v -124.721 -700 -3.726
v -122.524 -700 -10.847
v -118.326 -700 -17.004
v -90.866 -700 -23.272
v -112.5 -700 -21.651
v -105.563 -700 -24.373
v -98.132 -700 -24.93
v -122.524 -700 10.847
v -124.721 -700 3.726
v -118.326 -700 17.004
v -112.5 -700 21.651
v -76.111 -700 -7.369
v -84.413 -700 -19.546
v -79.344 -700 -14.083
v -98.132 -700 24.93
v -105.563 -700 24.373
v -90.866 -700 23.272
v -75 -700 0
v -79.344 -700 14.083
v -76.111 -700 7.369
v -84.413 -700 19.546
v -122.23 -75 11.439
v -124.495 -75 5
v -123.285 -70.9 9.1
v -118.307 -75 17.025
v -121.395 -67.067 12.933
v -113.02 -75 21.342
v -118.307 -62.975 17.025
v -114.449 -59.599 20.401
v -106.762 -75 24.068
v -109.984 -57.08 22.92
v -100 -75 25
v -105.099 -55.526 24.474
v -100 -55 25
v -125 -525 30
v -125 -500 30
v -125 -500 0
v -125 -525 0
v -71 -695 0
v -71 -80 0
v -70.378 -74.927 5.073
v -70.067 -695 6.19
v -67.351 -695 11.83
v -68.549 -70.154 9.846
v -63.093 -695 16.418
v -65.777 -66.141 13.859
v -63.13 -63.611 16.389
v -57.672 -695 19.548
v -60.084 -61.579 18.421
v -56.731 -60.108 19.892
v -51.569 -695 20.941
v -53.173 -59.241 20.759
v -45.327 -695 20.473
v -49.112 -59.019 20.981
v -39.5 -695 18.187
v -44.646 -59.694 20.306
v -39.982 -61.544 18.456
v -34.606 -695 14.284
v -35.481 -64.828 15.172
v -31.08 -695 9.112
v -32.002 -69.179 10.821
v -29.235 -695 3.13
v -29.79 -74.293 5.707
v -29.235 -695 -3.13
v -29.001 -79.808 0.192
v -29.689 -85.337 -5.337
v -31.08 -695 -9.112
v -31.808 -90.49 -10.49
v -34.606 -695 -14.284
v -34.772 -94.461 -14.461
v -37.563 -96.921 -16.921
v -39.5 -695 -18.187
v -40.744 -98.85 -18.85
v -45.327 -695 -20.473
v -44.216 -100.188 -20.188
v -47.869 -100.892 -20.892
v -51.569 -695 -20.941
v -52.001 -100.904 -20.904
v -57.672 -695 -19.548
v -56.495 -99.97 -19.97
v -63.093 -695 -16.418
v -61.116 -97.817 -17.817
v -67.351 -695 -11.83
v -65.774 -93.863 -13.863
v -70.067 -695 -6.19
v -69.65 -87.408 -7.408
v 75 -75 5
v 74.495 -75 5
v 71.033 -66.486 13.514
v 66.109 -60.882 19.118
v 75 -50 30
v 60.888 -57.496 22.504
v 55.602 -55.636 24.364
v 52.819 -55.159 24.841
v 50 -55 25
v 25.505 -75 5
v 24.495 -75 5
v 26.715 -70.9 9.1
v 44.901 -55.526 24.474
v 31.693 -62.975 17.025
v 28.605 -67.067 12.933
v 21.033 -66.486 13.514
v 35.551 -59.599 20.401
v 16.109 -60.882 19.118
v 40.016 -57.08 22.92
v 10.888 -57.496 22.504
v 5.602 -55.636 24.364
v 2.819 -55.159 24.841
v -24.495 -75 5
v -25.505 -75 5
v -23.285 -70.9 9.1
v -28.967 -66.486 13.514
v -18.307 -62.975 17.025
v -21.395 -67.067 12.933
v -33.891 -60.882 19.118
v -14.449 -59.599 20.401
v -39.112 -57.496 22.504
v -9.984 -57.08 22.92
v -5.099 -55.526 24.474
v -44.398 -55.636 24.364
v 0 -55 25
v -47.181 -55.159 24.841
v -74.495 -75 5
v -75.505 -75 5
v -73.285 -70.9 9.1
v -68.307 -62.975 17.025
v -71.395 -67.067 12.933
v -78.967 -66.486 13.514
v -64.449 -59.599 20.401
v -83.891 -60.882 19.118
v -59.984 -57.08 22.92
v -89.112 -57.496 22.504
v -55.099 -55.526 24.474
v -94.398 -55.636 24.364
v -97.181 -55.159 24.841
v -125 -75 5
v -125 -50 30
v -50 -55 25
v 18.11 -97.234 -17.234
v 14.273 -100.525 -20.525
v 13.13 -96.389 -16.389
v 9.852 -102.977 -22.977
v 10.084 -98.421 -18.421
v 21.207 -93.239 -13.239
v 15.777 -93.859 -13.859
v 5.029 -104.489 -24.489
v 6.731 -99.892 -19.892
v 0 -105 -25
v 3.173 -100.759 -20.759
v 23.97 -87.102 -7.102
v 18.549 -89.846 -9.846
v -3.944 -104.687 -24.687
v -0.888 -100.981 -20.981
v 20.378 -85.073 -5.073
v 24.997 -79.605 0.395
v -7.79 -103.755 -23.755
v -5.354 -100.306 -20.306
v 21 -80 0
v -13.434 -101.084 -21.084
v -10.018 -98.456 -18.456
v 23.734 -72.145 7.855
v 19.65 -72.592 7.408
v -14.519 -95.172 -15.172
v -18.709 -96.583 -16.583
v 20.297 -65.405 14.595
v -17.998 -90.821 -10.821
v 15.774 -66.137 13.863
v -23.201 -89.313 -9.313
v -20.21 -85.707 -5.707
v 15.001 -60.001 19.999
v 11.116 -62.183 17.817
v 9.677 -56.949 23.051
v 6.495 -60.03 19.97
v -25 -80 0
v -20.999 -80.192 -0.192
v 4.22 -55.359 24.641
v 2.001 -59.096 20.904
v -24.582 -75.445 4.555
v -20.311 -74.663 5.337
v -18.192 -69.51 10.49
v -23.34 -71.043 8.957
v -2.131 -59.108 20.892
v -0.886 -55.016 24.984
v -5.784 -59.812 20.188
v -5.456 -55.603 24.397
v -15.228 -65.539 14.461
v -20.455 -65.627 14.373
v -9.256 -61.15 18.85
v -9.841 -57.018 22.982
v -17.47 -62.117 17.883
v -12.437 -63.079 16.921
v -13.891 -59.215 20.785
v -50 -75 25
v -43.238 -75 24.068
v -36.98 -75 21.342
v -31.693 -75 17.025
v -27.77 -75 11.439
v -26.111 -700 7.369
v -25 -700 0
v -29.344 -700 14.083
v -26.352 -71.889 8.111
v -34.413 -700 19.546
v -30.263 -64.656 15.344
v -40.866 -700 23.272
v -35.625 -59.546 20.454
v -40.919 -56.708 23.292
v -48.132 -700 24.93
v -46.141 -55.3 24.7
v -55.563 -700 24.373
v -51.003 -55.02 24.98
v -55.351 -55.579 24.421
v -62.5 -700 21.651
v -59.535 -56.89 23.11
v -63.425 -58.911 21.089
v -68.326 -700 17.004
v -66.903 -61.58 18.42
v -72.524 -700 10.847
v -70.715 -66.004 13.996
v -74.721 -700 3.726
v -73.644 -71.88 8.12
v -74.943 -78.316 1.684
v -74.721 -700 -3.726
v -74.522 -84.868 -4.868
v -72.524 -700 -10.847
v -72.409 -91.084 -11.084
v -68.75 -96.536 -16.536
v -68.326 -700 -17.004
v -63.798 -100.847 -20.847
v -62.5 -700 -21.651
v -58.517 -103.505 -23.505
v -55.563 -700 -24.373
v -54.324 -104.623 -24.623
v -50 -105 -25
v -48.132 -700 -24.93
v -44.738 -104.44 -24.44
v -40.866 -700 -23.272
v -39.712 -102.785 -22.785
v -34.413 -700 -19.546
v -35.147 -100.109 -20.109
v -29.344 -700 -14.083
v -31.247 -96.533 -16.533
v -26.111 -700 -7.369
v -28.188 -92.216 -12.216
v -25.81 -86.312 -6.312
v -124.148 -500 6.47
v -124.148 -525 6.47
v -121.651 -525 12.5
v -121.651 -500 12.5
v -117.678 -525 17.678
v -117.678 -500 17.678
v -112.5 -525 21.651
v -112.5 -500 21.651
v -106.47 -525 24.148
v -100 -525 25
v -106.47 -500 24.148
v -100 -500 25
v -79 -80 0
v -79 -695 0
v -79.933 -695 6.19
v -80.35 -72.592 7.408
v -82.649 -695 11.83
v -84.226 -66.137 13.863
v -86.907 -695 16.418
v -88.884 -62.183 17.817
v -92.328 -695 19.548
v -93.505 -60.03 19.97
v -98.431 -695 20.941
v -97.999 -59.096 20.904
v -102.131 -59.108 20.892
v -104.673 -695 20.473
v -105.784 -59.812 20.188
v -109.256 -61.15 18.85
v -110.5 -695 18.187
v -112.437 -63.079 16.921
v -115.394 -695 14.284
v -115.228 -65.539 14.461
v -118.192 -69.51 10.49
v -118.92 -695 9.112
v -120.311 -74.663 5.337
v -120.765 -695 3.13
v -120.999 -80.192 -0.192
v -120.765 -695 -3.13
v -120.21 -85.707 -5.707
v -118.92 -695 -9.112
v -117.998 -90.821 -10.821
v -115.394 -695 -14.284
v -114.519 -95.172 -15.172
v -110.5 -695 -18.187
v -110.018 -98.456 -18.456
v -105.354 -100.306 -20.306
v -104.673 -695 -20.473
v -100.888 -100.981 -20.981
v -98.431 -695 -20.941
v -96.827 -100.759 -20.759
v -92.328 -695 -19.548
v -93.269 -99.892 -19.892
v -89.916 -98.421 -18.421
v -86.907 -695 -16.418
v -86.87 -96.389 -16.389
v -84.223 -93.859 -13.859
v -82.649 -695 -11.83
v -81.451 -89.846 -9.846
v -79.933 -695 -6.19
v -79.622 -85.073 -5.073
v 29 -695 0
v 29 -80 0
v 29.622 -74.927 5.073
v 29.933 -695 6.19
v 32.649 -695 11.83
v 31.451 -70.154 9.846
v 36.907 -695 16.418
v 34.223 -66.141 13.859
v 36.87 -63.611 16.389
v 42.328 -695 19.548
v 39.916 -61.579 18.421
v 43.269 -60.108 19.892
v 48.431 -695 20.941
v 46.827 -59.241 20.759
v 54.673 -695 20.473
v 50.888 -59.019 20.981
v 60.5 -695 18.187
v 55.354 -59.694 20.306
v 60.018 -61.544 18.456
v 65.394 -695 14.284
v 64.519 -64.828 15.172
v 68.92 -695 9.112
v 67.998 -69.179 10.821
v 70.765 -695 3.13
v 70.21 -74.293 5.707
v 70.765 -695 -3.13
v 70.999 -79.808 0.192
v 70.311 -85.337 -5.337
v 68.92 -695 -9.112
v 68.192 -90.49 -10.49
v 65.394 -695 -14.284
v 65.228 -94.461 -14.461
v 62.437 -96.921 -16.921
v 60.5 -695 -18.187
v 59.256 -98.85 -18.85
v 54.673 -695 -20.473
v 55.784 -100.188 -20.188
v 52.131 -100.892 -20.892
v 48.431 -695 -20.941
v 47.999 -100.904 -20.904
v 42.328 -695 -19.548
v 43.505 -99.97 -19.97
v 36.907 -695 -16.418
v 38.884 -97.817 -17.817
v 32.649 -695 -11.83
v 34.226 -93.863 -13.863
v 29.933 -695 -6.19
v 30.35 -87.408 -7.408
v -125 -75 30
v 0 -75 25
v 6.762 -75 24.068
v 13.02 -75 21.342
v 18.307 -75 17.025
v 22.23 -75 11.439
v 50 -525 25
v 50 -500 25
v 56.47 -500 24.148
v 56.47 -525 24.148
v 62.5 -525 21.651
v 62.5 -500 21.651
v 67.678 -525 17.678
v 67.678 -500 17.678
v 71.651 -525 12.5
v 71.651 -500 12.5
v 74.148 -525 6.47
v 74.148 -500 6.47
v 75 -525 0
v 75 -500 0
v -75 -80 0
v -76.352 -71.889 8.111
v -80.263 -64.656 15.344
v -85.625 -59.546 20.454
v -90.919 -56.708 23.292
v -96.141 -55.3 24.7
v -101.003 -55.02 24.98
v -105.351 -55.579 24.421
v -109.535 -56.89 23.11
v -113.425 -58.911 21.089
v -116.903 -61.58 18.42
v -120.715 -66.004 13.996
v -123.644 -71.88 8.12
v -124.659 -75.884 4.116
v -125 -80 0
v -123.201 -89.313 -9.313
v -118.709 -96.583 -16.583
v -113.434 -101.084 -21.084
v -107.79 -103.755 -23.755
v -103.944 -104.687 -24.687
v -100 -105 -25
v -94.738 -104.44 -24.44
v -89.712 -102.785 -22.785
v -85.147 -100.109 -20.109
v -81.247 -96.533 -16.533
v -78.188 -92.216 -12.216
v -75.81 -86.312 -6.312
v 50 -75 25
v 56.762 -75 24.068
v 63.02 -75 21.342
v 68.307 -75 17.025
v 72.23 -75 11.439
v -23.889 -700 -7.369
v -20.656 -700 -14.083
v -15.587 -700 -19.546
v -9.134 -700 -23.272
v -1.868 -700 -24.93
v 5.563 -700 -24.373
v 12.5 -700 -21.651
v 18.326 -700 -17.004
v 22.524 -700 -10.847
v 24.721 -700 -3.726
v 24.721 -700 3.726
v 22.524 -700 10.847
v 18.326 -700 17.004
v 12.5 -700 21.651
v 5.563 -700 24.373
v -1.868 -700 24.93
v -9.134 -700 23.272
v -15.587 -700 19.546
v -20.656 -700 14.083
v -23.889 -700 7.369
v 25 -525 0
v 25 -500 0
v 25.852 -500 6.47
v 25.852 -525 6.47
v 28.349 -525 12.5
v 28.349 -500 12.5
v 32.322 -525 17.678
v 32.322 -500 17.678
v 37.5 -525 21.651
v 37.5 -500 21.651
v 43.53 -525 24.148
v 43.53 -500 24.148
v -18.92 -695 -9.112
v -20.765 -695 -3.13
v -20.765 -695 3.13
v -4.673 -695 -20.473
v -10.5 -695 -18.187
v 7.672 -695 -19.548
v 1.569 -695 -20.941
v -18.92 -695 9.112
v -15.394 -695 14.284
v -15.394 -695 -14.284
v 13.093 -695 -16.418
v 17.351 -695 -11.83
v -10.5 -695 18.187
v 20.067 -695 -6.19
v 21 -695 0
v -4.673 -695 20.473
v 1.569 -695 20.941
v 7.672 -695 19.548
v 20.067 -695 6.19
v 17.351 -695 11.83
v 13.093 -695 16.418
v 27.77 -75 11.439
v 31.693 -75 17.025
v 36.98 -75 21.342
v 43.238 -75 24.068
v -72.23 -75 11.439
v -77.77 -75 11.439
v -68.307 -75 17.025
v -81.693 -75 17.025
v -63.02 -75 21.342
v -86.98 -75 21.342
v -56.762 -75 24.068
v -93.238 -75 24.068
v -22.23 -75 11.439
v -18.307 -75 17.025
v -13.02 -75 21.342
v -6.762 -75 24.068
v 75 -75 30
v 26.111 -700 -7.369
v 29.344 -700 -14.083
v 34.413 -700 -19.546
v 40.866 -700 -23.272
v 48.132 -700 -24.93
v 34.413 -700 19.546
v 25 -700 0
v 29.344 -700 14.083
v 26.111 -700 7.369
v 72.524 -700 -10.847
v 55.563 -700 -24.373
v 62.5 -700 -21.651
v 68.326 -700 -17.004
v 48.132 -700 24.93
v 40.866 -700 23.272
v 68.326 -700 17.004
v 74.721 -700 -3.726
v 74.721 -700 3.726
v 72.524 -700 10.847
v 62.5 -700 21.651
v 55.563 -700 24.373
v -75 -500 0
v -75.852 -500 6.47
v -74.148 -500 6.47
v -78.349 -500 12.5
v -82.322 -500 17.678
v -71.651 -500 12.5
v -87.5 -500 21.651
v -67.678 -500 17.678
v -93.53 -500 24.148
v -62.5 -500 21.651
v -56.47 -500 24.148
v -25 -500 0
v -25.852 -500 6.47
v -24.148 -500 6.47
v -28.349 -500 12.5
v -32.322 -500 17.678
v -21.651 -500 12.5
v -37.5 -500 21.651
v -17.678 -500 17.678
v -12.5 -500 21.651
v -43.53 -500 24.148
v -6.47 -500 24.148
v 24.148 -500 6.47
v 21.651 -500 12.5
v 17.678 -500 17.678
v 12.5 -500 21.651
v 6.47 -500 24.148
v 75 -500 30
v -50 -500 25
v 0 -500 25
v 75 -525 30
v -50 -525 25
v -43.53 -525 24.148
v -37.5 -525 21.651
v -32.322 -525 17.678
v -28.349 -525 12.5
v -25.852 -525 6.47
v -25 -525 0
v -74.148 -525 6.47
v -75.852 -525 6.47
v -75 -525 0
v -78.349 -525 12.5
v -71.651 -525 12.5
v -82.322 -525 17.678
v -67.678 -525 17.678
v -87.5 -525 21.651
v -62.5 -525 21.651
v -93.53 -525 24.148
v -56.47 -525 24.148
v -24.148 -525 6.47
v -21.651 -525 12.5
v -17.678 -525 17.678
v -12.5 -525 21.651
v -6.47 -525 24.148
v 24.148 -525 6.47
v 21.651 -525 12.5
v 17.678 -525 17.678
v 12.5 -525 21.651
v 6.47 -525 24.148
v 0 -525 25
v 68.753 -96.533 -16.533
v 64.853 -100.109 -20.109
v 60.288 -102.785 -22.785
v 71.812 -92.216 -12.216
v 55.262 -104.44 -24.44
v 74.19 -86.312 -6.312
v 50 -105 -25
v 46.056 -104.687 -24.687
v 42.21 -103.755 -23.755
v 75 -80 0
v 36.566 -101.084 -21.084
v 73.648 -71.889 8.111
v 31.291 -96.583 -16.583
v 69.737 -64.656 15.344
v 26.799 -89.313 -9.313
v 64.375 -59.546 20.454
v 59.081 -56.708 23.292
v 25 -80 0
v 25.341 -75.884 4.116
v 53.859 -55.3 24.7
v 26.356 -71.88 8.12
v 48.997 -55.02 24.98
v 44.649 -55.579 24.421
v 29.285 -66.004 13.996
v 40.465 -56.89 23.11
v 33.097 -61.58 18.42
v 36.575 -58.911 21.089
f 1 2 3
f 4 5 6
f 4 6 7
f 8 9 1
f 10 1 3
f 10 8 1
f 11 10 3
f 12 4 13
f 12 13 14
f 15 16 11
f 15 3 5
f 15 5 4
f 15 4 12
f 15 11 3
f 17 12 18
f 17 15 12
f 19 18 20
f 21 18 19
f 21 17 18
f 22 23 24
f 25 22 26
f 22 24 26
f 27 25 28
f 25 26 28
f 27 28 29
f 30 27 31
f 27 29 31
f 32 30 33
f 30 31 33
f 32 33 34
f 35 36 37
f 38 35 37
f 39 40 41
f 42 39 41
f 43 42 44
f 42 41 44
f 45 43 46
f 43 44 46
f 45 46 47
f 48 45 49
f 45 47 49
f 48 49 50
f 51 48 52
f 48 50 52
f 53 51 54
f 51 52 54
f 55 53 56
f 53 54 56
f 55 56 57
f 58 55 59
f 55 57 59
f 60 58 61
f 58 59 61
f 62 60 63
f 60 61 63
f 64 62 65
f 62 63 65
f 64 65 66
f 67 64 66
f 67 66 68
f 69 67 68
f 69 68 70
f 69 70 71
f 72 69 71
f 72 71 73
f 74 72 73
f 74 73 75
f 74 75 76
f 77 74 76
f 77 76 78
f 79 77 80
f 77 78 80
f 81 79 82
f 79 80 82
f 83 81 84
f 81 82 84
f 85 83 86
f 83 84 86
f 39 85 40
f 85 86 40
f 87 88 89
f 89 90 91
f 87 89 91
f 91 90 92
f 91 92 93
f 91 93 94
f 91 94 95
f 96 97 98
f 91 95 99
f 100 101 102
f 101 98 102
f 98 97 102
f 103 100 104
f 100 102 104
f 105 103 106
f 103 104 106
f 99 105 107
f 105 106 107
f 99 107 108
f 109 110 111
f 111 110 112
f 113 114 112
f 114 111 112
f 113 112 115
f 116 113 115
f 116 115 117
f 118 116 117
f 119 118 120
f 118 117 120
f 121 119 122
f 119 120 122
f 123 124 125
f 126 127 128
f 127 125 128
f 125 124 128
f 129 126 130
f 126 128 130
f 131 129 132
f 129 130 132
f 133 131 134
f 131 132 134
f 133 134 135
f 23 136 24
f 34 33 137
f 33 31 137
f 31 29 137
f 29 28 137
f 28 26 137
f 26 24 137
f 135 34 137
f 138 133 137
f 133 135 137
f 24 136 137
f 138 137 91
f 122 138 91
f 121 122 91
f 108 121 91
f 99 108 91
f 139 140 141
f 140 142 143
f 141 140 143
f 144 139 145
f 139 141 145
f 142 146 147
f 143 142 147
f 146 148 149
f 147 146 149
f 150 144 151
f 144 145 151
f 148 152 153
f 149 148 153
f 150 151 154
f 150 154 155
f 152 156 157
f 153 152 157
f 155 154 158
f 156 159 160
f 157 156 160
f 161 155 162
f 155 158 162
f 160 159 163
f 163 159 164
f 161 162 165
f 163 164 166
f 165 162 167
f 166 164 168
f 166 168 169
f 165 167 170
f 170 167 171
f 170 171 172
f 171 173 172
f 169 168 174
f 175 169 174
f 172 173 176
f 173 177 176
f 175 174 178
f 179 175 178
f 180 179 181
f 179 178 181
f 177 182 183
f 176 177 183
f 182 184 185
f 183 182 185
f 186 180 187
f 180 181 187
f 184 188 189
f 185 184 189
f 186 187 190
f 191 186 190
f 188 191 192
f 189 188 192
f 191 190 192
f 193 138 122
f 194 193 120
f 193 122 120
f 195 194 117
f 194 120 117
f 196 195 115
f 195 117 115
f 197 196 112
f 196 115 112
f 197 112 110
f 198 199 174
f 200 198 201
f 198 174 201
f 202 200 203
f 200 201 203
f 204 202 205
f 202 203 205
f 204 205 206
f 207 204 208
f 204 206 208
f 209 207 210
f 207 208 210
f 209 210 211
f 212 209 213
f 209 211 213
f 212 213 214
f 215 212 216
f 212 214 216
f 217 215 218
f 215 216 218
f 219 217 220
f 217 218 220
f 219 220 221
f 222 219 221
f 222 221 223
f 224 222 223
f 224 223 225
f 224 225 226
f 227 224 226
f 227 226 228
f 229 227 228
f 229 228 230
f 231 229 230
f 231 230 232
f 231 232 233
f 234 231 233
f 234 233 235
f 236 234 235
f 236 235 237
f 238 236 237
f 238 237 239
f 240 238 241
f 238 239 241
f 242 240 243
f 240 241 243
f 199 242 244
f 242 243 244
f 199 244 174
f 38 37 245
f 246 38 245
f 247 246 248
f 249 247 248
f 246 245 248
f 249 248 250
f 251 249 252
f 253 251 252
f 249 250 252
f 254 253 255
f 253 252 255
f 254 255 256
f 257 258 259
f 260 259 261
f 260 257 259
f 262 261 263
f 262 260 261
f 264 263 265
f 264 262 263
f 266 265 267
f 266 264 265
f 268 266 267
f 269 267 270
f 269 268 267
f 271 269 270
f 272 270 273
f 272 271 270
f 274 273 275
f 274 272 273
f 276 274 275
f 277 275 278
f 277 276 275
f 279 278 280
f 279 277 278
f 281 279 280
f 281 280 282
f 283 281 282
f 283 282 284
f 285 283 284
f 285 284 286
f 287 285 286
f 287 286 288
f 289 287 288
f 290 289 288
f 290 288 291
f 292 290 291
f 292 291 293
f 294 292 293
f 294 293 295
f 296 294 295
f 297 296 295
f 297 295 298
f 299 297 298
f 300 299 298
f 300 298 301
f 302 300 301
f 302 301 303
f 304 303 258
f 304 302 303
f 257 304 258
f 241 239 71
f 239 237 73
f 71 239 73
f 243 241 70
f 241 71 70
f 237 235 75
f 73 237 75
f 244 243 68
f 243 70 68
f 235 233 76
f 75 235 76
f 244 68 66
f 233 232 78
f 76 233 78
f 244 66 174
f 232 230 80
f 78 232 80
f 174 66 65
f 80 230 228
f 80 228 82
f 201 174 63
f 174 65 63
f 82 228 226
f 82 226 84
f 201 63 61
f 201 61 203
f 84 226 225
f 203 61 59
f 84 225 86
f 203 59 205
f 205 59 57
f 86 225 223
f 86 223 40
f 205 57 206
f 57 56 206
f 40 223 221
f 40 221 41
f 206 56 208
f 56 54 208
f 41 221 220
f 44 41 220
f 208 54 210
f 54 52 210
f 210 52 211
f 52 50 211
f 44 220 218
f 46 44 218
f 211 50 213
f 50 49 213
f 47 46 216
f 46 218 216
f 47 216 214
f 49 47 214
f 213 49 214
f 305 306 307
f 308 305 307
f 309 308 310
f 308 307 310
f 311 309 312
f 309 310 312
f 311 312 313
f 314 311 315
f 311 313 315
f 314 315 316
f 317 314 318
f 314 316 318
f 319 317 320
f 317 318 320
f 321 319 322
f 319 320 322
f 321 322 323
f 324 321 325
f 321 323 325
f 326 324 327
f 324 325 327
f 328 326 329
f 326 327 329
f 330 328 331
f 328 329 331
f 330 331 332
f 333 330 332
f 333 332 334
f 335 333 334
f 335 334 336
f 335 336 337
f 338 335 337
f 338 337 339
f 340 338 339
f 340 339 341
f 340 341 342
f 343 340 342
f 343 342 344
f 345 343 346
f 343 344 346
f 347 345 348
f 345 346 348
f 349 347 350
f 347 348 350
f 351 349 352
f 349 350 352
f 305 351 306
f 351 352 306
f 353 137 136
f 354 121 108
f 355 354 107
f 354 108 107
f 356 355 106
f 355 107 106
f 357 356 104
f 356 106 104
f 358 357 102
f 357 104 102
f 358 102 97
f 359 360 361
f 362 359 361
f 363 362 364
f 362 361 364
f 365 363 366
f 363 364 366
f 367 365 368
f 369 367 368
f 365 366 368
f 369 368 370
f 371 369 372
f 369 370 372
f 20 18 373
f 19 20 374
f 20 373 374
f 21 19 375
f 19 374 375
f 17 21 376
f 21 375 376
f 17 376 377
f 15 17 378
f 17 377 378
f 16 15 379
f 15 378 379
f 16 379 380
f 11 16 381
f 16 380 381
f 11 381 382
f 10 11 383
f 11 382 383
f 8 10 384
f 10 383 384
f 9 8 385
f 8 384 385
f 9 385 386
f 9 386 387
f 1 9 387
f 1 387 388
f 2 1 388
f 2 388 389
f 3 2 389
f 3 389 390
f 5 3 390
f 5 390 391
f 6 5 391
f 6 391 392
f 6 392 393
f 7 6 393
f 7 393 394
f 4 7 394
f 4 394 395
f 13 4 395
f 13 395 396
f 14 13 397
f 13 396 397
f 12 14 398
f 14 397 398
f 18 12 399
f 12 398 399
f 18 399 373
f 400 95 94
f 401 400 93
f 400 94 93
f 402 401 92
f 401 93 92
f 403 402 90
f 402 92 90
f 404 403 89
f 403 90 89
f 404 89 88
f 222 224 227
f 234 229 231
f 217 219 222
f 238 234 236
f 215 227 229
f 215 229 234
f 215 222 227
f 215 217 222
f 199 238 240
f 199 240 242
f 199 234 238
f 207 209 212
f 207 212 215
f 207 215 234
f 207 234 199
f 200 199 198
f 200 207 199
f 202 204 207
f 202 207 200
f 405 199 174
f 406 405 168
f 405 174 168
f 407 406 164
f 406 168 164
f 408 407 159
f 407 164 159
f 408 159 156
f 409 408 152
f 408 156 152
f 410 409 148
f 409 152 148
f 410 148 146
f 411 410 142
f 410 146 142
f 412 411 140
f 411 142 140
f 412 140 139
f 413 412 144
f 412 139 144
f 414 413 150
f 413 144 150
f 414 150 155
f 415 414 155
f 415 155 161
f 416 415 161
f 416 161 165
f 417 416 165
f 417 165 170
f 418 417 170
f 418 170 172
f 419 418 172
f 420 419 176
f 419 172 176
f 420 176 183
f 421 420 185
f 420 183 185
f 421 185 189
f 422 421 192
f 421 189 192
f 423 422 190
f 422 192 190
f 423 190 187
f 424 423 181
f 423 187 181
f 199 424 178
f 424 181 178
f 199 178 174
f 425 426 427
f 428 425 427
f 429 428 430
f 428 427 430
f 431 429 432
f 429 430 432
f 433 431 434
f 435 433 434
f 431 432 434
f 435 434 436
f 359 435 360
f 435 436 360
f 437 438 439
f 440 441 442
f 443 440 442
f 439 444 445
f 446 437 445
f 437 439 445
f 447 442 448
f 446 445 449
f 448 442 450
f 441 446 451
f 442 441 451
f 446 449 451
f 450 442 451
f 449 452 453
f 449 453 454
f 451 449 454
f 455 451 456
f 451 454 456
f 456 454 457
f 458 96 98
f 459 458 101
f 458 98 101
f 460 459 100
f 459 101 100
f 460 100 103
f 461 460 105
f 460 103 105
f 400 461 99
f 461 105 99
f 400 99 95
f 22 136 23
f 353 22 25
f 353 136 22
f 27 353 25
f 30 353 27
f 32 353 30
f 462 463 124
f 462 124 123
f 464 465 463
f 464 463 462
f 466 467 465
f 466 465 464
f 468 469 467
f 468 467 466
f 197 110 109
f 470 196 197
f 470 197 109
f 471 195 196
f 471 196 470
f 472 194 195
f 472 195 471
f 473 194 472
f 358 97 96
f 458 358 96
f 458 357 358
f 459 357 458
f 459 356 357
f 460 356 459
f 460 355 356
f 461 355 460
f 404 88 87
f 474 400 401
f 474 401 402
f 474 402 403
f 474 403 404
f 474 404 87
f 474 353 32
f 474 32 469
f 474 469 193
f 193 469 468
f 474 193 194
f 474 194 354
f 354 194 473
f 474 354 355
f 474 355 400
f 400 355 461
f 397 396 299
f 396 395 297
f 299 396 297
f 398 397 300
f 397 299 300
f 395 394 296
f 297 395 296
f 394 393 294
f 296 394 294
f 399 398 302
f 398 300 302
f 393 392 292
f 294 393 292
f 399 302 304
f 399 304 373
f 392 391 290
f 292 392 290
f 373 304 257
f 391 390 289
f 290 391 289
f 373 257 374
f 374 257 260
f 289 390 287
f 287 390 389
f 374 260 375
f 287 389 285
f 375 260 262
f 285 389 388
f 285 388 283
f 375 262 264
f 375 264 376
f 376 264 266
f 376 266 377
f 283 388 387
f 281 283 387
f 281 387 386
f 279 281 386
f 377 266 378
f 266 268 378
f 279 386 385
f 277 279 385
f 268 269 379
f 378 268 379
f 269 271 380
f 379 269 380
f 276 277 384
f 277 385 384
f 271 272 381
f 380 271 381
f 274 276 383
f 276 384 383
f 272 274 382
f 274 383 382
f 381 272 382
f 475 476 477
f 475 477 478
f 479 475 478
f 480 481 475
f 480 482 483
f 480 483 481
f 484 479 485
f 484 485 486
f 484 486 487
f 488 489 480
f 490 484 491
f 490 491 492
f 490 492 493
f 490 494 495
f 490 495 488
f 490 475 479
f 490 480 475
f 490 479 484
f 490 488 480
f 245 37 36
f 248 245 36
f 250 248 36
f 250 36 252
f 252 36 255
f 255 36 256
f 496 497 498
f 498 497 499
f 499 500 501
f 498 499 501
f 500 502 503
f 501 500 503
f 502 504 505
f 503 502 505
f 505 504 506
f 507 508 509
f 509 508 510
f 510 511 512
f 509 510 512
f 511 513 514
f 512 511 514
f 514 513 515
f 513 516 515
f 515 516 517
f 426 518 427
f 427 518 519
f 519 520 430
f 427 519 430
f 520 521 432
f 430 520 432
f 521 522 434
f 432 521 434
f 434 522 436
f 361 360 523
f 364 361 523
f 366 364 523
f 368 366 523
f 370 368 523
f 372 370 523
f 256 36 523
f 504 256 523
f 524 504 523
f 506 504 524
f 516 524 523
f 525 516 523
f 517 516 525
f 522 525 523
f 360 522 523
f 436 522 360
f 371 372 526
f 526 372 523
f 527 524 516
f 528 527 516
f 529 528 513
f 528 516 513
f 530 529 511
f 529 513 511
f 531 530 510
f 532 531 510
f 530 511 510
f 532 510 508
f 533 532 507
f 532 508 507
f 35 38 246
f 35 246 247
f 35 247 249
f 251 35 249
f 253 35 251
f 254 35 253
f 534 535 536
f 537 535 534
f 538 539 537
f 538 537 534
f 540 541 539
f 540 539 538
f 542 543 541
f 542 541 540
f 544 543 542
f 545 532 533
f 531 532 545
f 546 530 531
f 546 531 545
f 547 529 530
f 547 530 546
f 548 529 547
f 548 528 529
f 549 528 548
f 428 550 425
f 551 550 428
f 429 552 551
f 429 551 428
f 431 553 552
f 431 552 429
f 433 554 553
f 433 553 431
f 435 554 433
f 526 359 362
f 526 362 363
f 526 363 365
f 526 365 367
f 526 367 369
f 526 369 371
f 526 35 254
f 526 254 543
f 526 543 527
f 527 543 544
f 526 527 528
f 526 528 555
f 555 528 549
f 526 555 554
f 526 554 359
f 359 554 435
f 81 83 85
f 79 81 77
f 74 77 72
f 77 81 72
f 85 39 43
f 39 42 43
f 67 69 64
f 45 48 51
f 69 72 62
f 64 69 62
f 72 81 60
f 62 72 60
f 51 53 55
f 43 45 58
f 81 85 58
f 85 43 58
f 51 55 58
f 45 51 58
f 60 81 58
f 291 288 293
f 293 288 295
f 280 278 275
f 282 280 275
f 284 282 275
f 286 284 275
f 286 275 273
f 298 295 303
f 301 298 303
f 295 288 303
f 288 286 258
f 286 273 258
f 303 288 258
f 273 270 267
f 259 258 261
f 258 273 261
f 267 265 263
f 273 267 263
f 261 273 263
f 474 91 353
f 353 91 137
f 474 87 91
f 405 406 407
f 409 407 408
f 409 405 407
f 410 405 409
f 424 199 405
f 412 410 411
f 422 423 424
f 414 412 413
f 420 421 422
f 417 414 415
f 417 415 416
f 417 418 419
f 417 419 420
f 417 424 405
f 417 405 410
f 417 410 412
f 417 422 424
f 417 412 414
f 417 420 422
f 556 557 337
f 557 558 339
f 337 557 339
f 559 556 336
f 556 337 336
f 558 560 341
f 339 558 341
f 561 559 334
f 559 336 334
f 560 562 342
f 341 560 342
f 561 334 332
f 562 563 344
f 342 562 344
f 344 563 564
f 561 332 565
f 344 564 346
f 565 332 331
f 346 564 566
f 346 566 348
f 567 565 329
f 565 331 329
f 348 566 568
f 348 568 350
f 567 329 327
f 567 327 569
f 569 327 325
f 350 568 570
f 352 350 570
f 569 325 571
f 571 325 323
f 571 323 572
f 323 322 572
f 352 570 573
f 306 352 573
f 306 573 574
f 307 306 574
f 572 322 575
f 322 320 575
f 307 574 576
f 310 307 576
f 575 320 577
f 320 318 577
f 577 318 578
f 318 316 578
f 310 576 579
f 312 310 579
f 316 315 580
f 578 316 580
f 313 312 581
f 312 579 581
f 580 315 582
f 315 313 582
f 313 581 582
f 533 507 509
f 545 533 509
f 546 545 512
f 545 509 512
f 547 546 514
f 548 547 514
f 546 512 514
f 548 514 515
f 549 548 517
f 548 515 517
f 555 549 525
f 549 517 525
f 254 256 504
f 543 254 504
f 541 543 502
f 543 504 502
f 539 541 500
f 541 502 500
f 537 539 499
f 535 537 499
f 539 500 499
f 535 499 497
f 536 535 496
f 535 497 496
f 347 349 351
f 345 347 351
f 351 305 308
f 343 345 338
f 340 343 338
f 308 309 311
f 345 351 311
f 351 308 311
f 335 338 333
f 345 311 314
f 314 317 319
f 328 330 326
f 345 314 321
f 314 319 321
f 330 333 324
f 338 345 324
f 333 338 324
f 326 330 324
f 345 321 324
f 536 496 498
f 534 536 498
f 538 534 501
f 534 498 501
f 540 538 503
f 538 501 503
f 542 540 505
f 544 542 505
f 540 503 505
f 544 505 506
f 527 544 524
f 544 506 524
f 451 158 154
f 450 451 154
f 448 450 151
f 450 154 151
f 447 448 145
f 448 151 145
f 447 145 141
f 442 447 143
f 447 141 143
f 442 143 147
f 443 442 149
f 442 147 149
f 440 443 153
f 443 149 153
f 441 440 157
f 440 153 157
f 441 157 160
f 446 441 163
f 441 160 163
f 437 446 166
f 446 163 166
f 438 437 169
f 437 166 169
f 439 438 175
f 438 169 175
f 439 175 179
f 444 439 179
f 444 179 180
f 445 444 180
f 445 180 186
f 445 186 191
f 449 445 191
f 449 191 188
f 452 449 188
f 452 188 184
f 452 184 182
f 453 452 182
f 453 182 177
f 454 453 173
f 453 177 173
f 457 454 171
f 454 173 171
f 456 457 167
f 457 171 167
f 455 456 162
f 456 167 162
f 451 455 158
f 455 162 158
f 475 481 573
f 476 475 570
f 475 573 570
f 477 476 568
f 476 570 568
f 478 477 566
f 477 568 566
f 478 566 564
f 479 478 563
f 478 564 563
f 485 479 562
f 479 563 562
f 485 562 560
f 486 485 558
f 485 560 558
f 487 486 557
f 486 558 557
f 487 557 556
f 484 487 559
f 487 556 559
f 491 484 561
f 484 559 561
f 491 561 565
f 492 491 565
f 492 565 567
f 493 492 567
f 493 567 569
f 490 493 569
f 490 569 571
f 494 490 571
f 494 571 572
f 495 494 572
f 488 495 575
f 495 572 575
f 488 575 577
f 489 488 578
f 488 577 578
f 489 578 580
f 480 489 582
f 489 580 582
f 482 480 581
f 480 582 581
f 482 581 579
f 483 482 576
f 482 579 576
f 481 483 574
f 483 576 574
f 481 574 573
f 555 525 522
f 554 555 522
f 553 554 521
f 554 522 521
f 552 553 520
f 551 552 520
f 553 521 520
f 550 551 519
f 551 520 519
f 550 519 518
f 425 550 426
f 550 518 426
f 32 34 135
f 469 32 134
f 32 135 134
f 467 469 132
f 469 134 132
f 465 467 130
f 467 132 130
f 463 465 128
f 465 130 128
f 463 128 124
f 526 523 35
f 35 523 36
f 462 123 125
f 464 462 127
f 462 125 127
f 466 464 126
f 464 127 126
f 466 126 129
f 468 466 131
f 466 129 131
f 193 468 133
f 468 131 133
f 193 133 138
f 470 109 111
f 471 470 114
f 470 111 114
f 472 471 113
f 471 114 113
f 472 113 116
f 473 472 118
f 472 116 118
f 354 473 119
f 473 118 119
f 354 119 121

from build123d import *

# Parameters (mm, degrees)
F1_DEPTH    = 700
F0_R        = 25
F0_R_2      = 21
F4_DEPTH    = 25
F7_DEPTH    = 25
F10_DEPTH   = 5
F9_R        = 21
F1_FACE_R   = 25
F1_FACE_R_2 = 21
F11_DEPTH   = 50
F13_DEPTH   = 200


with BuildPart() as f1:
    # F0 (on Front) → F1 (new body)
    with BuildSketch(Plane.XZ):
        with BuildLine():
            Line((21, 0), (25, 0))
            ThreePointArc((25, 0), (0, 25), (-25, 0))
            Line((-25, 0), (-21, 0))
            ThreePointArc((-21, 0), (0, 21), (21, 0))
        make_face()
        with BuildLine():
            ThreePointArc((-25, 0), (0, -25), (25, 0))
            Line((25, 0), (21, 0))
            ThreePointArc((21, 0), (0, -21), (-21, 0))
            Line((-21, 0), (-25, 0))
        make_face()
    extrude(amount=F1_DEPTH)

    # F9 (on face) → F10, piece 2 (join)
    with BuildSketch(Plane.XZ.offset(700)):
        with BuildLine():
            ThreePointArc((-21, 0), (0, -21), (21, 0))
            ThreePointArc((21, 0), (0, 21), (-21, 0))
        make_face()
    extrude(amount=-F10_DEPTH)


with BuildPart() as f1b:
    # F0 (on Front) → F1, piece 2 (new body)
    with BuildSketch(Plane.XZ):
        with Locations((-100, 0)):
            Circle(F0_R)
        with Locations((-100, 0)):
            Circle(F0_R_2, mode=Mode.SUBTRACT)
    extrude(amount=F1_DEPTH)

    # F9 (on face) → F10, piece 4 (join)
    with BuildSketch(Plane.XZ.offset(700)):
        with Locations((-100, 0)):
            Circle(F9_R)
    extrude(amount=-F10_DEPTH)


with BuildPart() as f1c:
    # F0 (on Front) → F1, piece 3 (new body)
    with BuildSketch(Plane.XZ):
        with BuildLine():
            ThreePointArc((-75, 0), (-50, -25), (-25, 0))
            Line((-25, 0), (-29, 0))
            ThreePointArc((-29, 0), (-50, -21), (-71, 0))
            Line((-71, 0), (-75, 0))
        make_face()
        with BuildLine():
            Line((-29, 0), (-25, 0))
            ThreePointArc((-25, 0), (-50, 25), (-75, 0))
            Line((-75, 0), (-71, 0))
            ThreePointArc((-71, 0), (-50, 21), (-29, 0))
        make_face()
    extrude(amount=F1_DEPTH)

    # F9 (on face) → F10, piece 3 (join)
    with BuildSketch(Plane.XZ.offset(700)):
        with Locations((-50, 0)):
            Circle(F9_R)
    extrude(amount=-F10_DEPTH)


with BuildPart() as f1d:
    # F0 (on Front) → F1, piece 4 (new body)
    with BuildSketch(Plane.XZ):
        with BuildLine():
            ThreePointArc((75, 0), (50, 25), (25, 0))
            ThreePointArc((25, 0), (50, -25), (75, 0))
        make_face()
        with BuildLine():
            ThreePointArc((71, 0), (50, -21), (29, 0))
            ThreePointArc((29, 0), (50, 21), (71, 0))
        make_face(mode=Mode.SUBTRACT)
    extrude(amount=F1_DEPTH)

    # F9 (on face) → F10 (join)
    with BuildSketch(Plane.XZ.offset(700)):
        with BuildLine():
            ThreePointArc((29, 0), (50, -21), (71, 0))
            ThreePointArc((71, 0), (50, 21), (29, 0))
        make_face()
    extrude(amount=-F10_DEPTH)


with BuildPart() as f4:
    # F3 (on offset) → F4 (new body)
    with BuildSketch(Plane.XZ.offset(50)):
        with BuildLine():
            ThreePointArc((50, 25), (67.6776695297, 17.6776695297), (75, 0))
            Line((75, 0), (75, 25))
            Line((75, 25), (50, 25))
        make_face()
        with BuildLine():
            ThreePointArc((-100, 25), (-82.3223304703, 17.6776695297), (-75, 0))
            ThreePointArc((-75, 0), (-67.6776695297, 17.6776695297), (-50, 25))
            Line((-50, 25), (-100, 25))
        make_face()
        with BuildLine():
            Line((-100, 25), (-125, 25))
            Line((-125, 25), (-125, 0))
            ThreePointArc((-125, 0), (-117.6776695297, 17.6776695297), (-100, 25))
        make_face()
        with BuildLine():
            ThreePointArc((5.22e-08, 25), (17.6776695481, 17.6776695112), (25, 0))
            ThreePointArc((25, 0), (32.3223304703, 17.6776695297), (50, 25))
            Line((50, 25), (5.22e-08, 25))
        make_face()
        with BuildLine():
            ThreePointArc((-50, 25), (-32.3223304703, 17.6776695297), (-25, 0))
            ThreePointArc((-25, 0), (-17.6776695112, 17.6776695481), (5.22e-08, 25))
            Line((5.22e-08, 25), (-50, 25))
        make_face()
        Polygon((50, 25), (75, 25), (75, 30), (-125, 30), (-125, 25), (-100, 25), (-50, 25), (5.22e-08, 25), align=None)
    extrude(amount=F4_DEPTH)


with BuildPart() as f7:
    # F6 (on offset) → F7 (new body)
    with BuildSketch(Plane.XZ.offset(500)):
        with BuildLine():
            ThreePointArc((-50, 25), (-32.3223304703, 17.6776695297), (-25, 0))
            ThreePointArc((-25, 0), (-17.6776695112, 17.6776695481), (5.22e-08, 25))
            Line((5.22e-08, 25), (-50, 25))
        make_face()
        Polygon((50, 25), (75, 25), (75, 30), (-125, 30), (-125, 25), (-99.9999998635, 25), (-50, 25), (5.22e-08, 25), align=None)
        with BuildLine():
            Line((-99.9999998635, 25), (-125, 25))
            Line((-125, 25), (-125, 1.365e-07))
            ThreePointArc((-125, 1.365e-07), (-117.6776694331, 17.6776696262), (-99.9999998635, 25))
        make_face()
        with BuildLine():
            ThreePointArc((50, 25), (67.6776695297, 17.6776695297), (75, 0))
            Line((75, 0), (75, 25))
            Line((75, 25), (50, 25))
        make_face()
        with BuildLine():
            ThreePointArc((5.22e-08, 25), (17.6776695481, 17.6776695112), (25, 0))
            ThreePointArc((25, 0), (32.3223304703, 17.6776695297), (50, 25))
            Line((50, 25), (5.22e-08, 25))
        make_face()
        with BuildLine():
            ThreePointArc((-99.9999998635, 25), (-82.3223304221, 17.6776694814), (-75, 0))
            ThreePointArc((-75, 0), (-67.6776695297, 17.6776695297), (-50, 25))
            Line((-50, 25), (-99.9999998635, 25))
        make_face()
    extrude(amount=F7_DEPTH)


with BuildPart() as f11_tool:
    # F1_face (on face) + F8 (on face) → F11 (new body)
    with BuildSketch(Plane(origin=(-100, 0, 0), x_dir=(1, 0, 0), z_dir=(0, 1, 0))):
        with Locations((50, 0)):
            Circle(F1_FACE_R)
        with Locations((50, 0)):
            Circle(F1_FACE_R_2, mode=Mode.SUBTRACT)
        with Locations((150, 0)):
            Circle(F1_FACE_R)
        with Locations((150, 0)):
            Circle(F1_FACE_R_2, mode=Mode.SUBTRACT)
        with Locations((100, 0)):
            Circle(F1_FACE_R)
        with Locations((100, 0)):
            Circle(F1_FACE_R_2, mode=Mode.SUBTRACT)
    with BuildSketch(Plane(origin=(0, 0, 0), x_dir=(-1, 0, 0), z_dir=(0, 1, 0))):
        with BuildLine():
            ThreePointArc((125, 0), (100, 25), (75, 0))
            ThreePointArc((75, 0), (100, -25), (125, 0))
        make_face()
        with BuildLine():
            ThreePointArc((79, 0), (100, 21), (121, 0))
            ThreePointArc((121, 0), (100, -21), (79, 0))
        make_face(mode=Mode.SUBTRACT)
    extrude(amount=-F11_DEPTH)


with BuildPart() as f1_1:
    add(f1.part)

    # F11: cut by f11_tool
    add(f11_tool.part, mode=Mode.SUBTRACT)


with BuildPart() as f1b_1:
    add(f1b.part)

    # F11: cut by f11_tool
    add(f11_tool.part, mode=Mode.SUBTRACT)


with BuildPart() as f1c_1:
    add(f1c.part)

    # F11: cut by f11_tool
    add(f11_tool.part, mode=Mode.SUBTRACT)


with BuildPart() as f1d_1:
    add(f1d.part)

    # F11: cut by f11_tool
    add(f11_tool.part, mode=Mode.SUBTRACT)


with BuildPart() as f13_tool:
    # F12 (on face) → F13 (new body)
    with BuildSketch(Plane(origin=(-125, 0, 0), x_dir=(0, -1, 0), z_dir=(-1, 0, 0))):
        Polygon((105, -25), (50, 30), (50, -25), align=None)
    extrude(amount=-F13_DEPTH)


with BuildPart() as f1_2:
    add(f1_1.part)

    # F13: cut by f13_tool
    add(f13_tool.part, mode=Mode.SUBTRACT)


with BuildPart() as f1b_2:
    add(f1b_1.part)

    # F13: cut by f13_tool
    add(f13_tool.part, mode=Mode.SUBTRACT)


with BuildPart() as f1c_2:
    add(f1c_1.part)

    # F13: cut by f13_tool
    add(f13_tool.part, mode=Mode.SUBTRACT)


with BuildPart() as f1d_2:
    add(f1d_1.part)

    # F13: cut by f13_tool
    add(f13_tool.part, mode=Mode.SUBTRACT)


with BuildPart() as f4_1:
    add(f4.part)

    # F13: cut by f13_tool
    add(f13_tool.part, mode=Mode.SUBTRACT)


solid = Compound([f7.part, f1_2.part, f1b_2.part, f1c_2.part, f1d_2.part, f4_1.part])
